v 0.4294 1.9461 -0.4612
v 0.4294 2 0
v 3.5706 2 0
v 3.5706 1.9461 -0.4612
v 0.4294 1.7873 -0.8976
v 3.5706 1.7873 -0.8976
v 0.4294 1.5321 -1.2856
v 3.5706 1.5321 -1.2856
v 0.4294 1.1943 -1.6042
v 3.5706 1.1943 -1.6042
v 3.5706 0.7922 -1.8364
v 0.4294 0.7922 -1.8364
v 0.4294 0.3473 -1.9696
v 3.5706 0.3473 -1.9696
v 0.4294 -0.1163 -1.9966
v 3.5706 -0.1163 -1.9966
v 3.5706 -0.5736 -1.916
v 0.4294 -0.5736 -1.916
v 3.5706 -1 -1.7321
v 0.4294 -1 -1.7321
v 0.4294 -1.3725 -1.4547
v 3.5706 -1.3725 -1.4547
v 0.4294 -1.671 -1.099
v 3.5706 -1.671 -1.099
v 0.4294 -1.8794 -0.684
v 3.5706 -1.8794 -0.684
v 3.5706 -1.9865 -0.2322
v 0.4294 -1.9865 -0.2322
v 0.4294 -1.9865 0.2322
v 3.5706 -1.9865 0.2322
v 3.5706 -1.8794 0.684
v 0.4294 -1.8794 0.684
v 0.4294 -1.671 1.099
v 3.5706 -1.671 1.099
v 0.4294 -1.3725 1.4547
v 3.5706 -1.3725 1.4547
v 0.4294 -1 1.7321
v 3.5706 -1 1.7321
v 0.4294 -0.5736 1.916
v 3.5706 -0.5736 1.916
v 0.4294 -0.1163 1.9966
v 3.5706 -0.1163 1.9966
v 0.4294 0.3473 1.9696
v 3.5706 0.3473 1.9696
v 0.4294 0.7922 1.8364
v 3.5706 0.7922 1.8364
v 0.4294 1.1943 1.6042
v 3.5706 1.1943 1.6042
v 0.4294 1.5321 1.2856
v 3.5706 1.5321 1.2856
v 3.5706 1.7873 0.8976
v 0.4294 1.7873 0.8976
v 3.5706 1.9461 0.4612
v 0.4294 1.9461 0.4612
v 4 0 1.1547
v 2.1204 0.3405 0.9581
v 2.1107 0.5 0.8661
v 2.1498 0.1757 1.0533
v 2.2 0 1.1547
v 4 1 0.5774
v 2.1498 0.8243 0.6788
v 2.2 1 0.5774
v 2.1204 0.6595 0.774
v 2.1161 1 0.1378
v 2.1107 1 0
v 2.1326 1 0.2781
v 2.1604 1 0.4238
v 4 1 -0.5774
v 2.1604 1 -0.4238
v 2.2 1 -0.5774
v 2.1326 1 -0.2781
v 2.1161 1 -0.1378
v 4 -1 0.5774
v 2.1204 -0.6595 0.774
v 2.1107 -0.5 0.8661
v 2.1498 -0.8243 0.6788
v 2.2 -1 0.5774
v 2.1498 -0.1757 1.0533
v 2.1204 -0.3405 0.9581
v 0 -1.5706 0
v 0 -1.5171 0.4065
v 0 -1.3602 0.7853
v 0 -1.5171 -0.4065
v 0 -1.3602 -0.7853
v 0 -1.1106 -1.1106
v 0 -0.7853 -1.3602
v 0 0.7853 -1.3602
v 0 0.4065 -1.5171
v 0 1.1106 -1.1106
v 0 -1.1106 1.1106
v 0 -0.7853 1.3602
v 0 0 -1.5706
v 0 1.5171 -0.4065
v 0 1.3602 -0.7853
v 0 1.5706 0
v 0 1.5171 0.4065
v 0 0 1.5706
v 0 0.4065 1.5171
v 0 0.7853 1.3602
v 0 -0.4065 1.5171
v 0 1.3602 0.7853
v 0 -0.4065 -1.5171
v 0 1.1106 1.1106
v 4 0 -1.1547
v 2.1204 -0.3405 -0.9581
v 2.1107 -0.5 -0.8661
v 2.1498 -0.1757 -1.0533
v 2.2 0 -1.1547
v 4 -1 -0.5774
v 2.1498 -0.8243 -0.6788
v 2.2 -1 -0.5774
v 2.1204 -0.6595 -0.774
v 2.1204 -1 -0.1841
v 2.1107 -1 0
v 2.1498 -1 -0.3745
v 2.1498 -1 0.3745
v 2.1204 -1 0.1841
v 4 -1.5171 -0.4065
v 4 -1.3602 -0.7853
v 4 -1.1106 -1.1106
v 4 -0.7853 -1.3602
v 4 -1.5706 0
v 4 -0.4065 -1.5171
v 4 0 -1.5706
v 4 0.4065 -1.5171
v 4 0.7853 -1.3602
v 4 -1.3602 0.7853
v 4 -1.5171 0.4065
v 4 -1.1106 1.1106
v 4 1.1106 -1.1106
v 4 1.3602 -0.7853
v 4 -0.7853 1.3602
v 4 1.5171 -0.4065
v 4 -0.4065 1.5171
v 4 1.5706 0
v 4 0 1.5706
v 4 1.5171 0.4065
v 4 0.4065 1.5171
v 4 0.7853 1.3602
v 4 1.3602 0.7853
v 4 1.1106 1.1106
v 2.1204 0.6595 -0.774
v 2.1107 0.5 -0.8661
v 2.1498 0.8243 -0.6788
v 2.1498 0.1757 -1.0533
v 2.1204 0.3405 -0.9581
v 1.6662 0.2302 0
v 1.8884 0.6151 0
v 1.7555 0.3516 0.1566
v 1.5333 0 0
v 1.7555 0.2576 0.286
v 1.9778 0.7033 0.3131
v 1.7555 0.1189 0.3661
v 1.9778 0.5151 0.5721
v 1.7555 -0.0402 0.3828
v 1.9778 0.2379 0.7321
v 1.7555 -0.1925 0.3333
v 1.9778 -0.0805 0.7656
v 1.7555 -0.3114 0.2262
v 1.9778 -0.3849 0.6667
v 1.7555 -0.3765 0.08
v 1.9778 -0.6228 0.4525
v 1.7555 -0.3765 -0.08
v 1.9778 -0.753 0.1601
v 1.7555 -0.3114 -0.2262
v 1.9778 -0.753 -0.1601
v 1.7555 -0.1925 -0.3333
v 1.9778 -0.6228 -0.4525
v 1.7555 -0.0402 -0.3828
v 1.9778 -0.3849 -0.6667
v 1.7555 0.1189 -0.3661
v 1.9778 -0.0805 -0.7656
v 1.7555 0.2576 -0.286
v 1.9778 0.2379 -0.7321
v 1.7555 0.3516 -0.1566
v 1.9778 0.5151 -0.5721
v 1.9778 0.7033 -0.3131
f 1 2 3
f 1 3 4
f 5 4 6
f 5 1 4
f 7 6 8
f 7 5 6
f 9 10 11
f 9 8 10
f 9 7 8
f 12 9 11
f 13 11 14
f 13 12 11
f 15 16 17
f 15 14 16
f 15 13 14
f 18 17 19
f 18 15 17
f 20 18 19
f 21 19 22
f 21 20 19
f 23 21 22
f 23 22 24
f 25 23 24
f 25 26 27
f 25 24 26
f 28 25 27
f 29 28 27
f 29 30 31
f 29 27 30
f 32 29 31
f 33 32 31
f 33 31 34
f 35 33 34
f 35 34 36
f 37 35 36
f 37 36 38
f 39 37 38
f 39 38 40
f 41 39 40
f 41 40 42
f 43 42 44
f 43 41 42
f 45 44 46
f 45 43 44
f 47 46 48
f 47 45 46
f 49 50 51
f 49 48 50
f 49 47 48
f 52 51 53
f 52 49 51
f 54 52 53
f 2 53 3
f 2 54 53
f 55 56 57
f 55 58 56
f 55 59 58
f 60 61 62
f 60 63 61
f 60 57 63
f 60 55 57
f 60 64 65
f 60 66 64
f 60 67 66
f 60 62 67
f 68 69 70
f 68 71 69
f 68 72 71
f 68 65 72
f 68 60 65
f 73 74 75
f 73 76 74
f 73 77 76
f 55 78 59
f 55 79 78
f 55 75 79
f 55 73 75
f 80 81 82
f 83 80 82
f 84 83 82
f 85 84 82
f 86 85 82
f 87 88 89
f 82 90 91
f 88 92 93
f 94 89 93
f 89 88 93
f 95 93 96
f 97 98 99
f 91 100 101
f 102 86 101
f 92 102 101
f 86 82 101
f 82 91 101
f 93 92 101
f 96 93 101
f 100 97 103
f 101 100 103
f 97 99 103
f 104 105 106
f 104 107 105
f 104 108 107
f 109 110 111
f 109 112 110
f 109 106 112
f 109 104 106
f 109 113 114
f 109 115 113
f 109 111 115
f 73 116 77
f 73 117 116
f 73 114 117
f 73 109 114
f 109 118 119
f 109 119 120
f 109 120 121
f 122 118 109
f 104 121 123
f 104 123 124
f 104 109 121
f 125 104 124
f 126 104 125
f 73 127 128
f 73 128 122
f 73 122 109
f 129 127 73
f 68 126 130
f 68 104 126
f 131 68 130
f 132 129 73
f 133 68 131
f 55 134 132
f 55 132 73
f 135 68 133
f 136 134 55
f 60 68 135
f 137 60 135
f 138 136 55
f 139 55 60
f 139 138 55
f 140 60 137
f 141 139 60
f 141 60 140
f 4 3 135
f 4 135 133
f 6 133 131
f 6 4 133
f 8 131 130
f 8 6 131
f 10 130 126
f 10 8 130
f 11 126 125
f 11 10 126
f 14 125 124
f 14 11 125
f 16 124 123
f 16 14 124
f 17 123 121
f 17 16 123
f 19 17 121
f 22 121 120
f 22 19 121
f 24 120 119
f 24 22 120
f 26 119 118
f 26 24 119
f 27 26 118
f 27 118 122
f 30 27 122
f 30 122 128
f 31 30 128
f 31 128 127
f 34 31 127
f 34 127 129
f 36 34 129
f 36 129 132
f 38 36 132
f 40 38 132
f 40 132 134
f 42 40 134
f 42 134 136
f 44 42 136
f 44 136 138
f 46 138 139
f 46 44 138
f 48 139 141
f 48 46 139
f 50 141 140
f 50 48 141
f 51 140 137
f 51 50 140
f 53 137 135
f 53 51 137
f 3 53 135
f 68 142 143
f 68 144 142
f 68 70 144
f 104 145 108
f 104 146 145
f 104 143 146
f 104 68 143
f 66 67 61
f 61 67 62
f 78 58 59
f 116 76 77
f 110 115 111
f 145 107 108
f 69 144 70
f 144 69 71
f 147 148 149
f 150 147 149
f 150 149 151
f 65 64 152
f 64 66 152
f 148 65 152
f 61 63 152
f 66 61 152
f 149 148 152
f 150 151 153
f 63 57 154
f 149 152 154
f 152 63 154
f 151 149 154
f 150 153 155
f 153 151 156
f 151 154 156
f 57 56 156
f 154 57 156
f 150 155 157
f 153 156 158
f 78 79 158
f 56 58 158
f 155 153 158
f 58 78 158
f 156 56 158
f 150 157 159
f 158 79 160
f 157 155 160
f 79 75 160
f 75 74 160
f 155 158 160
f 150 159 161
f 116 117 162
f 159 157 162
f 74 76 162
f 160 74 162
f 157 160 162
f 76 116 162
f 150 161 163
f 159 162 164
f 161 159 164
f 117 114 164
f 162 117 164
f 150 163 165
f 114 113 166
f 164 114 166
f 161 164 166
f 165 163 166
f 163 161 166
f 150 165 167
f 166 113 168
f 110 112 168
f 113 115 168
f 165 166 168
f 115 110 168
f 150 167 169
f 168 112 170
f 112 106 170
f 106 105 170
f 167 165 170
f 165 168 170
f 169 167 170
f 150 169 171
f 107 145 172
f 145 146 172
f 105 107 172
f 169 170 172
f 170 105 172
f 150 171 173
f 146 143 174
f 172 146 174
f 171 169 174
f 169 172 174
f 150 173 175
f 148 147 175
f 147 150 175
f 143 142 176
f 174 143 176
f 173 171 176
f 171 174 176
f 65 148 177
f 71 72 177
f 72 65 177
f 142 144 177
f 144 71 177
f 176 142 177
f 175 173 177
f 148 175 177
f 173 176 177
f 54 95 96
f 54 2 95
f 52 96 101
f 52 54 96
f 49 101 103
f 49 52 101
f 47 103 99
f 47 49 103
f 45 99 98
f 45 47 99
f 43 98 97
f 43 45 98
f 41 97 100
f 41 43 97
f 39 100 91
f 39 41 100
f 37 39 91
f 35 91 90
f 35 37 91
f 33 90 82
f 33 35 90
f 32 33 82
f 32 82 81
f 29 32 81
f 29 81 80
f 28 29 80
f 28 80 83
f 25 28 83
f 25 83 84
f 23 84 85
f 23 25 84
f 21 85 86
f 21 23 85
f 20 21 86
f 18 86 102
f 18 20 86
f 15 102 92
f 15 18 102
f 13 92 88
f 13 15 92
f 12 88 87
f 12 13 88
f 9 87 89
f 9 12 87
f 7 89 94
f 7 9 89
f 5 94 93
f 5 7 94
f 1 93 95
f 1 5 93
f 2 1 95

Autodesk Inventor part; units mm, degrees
ref_plane "YZ Plane" through (0, 0, 0) normal (1, 0, 0) x (0, 1, 0)
ref_plane "XZ Plane" through (0, 0, 0) normal (0, 1, 0) x (-1, 0, 0)
sketch "Sketch1" plane through (0, 0, 0) normal (0, 0, 1) x (1, 0, 0)
  line L0 (0, 0) -> (1.5333, 0)
  line L1 (4, 1.1547) -> (4, 2)
  line L2 (4, 2) -> (0, 2)
  line L3 (4, 1.1547) -> (2.2, 1.1547)
  line L4 (2.2, 1.1547) -> (1.5333, 0)
  line L5 (0, -0.4) -> (0, 2.4) projected
  line L6 (0, 2) -> (0, 0)
  dimension "d0" = 1.8
  dimension "d1" = 60
  dimension "d2" = 4
  dimension "d3" = 2.3094
  dimension "d5" = 4
revolve "Body" add sketch "Sketch1" angle 360 about axis through (0, 0, 0) along (1, 0, 0)
chamfer "Chamfer1" distance 0.4294 angle 45 1 edges at (4, -2, 0) measured on face at (4, 1.6877, -0.2517)
sketch "Sketch2" plane through (4, 0, 0) normal (1, 0, 0) x (0, 0, -1)
  circle A0 centre (0, 0) radius 1.1547 projected
  line L0 (-0.5774, 1) -> (0.5774, 1)
  line L1 (0.5774, 1) -> (1.1547, 0)
  line L2 (1.1547, 0) -> (0.5774, -1)
  line L3 (0.5774, -1) -> (-0.5774, -1)
  line L4 (-0.5774, -1) -> (-1.1547, 0)
  line L5 (-1.1547, 0) -> (-0.5774, 1)
extrude "Slot" add sketch "Sketch2" against normal up to next contours L1 A0 | A0 L2 | L0 A0 | A0 L3 | L5 A0 | A0 L4
thread "Thread" size "M4x0.7" class "6g" standard "ANSI Metric M Profile" length 4
chamfer "Chamfer2" distance 0.4294 angle 45 1 edges at (0, -2, 0) measured on face at (1.1902, 1.9741, -0.3208)
ref_plane "Work Plane1" through (2, 0, 0) normal (0, 0.5, 0.866) x (1, 0, 0)
equation "\"d0\" = INTI"
equation "\"d2\" = NND"
equation "\"d3\" = 1.1547 * SW"
equation "\"d5\" = NLG"
equation "\"d7\" = -0.5 * GD1 + 0.5 * NND"
equation "\"d8\" = FAWI"
equation "\"d29\" = -0.5 * GD1 + 0.5 * NND"
equation "\"d11\" = NLG"
equation "\"d13\" = -0.5 * GD1 + 0.5 * NND"
equation "\"d14\" = FAWI"
equation "\"d30\" = -0.5 * GD1 + 0.5 * NND"
equation "\"NND\" = 4"
equation "\"NLG\" = 4"
equation "\"INTI\" = 1.8"
equation "\"FAWI\" = 45deg"
equation "\"SW\" = 2"
equation "\"GD1\" = THREADDIA - 1.2269 * PTC"
equation "\"FAWI1\" = 30deg"
equation "\"GUL\" = 0.61345 * PTC"
equation "\"SPD\" = 2.5"
equation "\"TOA\" = 30deg"
equation "\"THREADDIA\" = 4"
equation "\"PTC\" = 0.7"
equation "\"GAL\" = 0.61345 * PTC"
equation "\"E0\" = 1.155 * SW"
properties part number "ANSI B18.3.6M - M4x0.7 x 4" material "Steel, Mild"
